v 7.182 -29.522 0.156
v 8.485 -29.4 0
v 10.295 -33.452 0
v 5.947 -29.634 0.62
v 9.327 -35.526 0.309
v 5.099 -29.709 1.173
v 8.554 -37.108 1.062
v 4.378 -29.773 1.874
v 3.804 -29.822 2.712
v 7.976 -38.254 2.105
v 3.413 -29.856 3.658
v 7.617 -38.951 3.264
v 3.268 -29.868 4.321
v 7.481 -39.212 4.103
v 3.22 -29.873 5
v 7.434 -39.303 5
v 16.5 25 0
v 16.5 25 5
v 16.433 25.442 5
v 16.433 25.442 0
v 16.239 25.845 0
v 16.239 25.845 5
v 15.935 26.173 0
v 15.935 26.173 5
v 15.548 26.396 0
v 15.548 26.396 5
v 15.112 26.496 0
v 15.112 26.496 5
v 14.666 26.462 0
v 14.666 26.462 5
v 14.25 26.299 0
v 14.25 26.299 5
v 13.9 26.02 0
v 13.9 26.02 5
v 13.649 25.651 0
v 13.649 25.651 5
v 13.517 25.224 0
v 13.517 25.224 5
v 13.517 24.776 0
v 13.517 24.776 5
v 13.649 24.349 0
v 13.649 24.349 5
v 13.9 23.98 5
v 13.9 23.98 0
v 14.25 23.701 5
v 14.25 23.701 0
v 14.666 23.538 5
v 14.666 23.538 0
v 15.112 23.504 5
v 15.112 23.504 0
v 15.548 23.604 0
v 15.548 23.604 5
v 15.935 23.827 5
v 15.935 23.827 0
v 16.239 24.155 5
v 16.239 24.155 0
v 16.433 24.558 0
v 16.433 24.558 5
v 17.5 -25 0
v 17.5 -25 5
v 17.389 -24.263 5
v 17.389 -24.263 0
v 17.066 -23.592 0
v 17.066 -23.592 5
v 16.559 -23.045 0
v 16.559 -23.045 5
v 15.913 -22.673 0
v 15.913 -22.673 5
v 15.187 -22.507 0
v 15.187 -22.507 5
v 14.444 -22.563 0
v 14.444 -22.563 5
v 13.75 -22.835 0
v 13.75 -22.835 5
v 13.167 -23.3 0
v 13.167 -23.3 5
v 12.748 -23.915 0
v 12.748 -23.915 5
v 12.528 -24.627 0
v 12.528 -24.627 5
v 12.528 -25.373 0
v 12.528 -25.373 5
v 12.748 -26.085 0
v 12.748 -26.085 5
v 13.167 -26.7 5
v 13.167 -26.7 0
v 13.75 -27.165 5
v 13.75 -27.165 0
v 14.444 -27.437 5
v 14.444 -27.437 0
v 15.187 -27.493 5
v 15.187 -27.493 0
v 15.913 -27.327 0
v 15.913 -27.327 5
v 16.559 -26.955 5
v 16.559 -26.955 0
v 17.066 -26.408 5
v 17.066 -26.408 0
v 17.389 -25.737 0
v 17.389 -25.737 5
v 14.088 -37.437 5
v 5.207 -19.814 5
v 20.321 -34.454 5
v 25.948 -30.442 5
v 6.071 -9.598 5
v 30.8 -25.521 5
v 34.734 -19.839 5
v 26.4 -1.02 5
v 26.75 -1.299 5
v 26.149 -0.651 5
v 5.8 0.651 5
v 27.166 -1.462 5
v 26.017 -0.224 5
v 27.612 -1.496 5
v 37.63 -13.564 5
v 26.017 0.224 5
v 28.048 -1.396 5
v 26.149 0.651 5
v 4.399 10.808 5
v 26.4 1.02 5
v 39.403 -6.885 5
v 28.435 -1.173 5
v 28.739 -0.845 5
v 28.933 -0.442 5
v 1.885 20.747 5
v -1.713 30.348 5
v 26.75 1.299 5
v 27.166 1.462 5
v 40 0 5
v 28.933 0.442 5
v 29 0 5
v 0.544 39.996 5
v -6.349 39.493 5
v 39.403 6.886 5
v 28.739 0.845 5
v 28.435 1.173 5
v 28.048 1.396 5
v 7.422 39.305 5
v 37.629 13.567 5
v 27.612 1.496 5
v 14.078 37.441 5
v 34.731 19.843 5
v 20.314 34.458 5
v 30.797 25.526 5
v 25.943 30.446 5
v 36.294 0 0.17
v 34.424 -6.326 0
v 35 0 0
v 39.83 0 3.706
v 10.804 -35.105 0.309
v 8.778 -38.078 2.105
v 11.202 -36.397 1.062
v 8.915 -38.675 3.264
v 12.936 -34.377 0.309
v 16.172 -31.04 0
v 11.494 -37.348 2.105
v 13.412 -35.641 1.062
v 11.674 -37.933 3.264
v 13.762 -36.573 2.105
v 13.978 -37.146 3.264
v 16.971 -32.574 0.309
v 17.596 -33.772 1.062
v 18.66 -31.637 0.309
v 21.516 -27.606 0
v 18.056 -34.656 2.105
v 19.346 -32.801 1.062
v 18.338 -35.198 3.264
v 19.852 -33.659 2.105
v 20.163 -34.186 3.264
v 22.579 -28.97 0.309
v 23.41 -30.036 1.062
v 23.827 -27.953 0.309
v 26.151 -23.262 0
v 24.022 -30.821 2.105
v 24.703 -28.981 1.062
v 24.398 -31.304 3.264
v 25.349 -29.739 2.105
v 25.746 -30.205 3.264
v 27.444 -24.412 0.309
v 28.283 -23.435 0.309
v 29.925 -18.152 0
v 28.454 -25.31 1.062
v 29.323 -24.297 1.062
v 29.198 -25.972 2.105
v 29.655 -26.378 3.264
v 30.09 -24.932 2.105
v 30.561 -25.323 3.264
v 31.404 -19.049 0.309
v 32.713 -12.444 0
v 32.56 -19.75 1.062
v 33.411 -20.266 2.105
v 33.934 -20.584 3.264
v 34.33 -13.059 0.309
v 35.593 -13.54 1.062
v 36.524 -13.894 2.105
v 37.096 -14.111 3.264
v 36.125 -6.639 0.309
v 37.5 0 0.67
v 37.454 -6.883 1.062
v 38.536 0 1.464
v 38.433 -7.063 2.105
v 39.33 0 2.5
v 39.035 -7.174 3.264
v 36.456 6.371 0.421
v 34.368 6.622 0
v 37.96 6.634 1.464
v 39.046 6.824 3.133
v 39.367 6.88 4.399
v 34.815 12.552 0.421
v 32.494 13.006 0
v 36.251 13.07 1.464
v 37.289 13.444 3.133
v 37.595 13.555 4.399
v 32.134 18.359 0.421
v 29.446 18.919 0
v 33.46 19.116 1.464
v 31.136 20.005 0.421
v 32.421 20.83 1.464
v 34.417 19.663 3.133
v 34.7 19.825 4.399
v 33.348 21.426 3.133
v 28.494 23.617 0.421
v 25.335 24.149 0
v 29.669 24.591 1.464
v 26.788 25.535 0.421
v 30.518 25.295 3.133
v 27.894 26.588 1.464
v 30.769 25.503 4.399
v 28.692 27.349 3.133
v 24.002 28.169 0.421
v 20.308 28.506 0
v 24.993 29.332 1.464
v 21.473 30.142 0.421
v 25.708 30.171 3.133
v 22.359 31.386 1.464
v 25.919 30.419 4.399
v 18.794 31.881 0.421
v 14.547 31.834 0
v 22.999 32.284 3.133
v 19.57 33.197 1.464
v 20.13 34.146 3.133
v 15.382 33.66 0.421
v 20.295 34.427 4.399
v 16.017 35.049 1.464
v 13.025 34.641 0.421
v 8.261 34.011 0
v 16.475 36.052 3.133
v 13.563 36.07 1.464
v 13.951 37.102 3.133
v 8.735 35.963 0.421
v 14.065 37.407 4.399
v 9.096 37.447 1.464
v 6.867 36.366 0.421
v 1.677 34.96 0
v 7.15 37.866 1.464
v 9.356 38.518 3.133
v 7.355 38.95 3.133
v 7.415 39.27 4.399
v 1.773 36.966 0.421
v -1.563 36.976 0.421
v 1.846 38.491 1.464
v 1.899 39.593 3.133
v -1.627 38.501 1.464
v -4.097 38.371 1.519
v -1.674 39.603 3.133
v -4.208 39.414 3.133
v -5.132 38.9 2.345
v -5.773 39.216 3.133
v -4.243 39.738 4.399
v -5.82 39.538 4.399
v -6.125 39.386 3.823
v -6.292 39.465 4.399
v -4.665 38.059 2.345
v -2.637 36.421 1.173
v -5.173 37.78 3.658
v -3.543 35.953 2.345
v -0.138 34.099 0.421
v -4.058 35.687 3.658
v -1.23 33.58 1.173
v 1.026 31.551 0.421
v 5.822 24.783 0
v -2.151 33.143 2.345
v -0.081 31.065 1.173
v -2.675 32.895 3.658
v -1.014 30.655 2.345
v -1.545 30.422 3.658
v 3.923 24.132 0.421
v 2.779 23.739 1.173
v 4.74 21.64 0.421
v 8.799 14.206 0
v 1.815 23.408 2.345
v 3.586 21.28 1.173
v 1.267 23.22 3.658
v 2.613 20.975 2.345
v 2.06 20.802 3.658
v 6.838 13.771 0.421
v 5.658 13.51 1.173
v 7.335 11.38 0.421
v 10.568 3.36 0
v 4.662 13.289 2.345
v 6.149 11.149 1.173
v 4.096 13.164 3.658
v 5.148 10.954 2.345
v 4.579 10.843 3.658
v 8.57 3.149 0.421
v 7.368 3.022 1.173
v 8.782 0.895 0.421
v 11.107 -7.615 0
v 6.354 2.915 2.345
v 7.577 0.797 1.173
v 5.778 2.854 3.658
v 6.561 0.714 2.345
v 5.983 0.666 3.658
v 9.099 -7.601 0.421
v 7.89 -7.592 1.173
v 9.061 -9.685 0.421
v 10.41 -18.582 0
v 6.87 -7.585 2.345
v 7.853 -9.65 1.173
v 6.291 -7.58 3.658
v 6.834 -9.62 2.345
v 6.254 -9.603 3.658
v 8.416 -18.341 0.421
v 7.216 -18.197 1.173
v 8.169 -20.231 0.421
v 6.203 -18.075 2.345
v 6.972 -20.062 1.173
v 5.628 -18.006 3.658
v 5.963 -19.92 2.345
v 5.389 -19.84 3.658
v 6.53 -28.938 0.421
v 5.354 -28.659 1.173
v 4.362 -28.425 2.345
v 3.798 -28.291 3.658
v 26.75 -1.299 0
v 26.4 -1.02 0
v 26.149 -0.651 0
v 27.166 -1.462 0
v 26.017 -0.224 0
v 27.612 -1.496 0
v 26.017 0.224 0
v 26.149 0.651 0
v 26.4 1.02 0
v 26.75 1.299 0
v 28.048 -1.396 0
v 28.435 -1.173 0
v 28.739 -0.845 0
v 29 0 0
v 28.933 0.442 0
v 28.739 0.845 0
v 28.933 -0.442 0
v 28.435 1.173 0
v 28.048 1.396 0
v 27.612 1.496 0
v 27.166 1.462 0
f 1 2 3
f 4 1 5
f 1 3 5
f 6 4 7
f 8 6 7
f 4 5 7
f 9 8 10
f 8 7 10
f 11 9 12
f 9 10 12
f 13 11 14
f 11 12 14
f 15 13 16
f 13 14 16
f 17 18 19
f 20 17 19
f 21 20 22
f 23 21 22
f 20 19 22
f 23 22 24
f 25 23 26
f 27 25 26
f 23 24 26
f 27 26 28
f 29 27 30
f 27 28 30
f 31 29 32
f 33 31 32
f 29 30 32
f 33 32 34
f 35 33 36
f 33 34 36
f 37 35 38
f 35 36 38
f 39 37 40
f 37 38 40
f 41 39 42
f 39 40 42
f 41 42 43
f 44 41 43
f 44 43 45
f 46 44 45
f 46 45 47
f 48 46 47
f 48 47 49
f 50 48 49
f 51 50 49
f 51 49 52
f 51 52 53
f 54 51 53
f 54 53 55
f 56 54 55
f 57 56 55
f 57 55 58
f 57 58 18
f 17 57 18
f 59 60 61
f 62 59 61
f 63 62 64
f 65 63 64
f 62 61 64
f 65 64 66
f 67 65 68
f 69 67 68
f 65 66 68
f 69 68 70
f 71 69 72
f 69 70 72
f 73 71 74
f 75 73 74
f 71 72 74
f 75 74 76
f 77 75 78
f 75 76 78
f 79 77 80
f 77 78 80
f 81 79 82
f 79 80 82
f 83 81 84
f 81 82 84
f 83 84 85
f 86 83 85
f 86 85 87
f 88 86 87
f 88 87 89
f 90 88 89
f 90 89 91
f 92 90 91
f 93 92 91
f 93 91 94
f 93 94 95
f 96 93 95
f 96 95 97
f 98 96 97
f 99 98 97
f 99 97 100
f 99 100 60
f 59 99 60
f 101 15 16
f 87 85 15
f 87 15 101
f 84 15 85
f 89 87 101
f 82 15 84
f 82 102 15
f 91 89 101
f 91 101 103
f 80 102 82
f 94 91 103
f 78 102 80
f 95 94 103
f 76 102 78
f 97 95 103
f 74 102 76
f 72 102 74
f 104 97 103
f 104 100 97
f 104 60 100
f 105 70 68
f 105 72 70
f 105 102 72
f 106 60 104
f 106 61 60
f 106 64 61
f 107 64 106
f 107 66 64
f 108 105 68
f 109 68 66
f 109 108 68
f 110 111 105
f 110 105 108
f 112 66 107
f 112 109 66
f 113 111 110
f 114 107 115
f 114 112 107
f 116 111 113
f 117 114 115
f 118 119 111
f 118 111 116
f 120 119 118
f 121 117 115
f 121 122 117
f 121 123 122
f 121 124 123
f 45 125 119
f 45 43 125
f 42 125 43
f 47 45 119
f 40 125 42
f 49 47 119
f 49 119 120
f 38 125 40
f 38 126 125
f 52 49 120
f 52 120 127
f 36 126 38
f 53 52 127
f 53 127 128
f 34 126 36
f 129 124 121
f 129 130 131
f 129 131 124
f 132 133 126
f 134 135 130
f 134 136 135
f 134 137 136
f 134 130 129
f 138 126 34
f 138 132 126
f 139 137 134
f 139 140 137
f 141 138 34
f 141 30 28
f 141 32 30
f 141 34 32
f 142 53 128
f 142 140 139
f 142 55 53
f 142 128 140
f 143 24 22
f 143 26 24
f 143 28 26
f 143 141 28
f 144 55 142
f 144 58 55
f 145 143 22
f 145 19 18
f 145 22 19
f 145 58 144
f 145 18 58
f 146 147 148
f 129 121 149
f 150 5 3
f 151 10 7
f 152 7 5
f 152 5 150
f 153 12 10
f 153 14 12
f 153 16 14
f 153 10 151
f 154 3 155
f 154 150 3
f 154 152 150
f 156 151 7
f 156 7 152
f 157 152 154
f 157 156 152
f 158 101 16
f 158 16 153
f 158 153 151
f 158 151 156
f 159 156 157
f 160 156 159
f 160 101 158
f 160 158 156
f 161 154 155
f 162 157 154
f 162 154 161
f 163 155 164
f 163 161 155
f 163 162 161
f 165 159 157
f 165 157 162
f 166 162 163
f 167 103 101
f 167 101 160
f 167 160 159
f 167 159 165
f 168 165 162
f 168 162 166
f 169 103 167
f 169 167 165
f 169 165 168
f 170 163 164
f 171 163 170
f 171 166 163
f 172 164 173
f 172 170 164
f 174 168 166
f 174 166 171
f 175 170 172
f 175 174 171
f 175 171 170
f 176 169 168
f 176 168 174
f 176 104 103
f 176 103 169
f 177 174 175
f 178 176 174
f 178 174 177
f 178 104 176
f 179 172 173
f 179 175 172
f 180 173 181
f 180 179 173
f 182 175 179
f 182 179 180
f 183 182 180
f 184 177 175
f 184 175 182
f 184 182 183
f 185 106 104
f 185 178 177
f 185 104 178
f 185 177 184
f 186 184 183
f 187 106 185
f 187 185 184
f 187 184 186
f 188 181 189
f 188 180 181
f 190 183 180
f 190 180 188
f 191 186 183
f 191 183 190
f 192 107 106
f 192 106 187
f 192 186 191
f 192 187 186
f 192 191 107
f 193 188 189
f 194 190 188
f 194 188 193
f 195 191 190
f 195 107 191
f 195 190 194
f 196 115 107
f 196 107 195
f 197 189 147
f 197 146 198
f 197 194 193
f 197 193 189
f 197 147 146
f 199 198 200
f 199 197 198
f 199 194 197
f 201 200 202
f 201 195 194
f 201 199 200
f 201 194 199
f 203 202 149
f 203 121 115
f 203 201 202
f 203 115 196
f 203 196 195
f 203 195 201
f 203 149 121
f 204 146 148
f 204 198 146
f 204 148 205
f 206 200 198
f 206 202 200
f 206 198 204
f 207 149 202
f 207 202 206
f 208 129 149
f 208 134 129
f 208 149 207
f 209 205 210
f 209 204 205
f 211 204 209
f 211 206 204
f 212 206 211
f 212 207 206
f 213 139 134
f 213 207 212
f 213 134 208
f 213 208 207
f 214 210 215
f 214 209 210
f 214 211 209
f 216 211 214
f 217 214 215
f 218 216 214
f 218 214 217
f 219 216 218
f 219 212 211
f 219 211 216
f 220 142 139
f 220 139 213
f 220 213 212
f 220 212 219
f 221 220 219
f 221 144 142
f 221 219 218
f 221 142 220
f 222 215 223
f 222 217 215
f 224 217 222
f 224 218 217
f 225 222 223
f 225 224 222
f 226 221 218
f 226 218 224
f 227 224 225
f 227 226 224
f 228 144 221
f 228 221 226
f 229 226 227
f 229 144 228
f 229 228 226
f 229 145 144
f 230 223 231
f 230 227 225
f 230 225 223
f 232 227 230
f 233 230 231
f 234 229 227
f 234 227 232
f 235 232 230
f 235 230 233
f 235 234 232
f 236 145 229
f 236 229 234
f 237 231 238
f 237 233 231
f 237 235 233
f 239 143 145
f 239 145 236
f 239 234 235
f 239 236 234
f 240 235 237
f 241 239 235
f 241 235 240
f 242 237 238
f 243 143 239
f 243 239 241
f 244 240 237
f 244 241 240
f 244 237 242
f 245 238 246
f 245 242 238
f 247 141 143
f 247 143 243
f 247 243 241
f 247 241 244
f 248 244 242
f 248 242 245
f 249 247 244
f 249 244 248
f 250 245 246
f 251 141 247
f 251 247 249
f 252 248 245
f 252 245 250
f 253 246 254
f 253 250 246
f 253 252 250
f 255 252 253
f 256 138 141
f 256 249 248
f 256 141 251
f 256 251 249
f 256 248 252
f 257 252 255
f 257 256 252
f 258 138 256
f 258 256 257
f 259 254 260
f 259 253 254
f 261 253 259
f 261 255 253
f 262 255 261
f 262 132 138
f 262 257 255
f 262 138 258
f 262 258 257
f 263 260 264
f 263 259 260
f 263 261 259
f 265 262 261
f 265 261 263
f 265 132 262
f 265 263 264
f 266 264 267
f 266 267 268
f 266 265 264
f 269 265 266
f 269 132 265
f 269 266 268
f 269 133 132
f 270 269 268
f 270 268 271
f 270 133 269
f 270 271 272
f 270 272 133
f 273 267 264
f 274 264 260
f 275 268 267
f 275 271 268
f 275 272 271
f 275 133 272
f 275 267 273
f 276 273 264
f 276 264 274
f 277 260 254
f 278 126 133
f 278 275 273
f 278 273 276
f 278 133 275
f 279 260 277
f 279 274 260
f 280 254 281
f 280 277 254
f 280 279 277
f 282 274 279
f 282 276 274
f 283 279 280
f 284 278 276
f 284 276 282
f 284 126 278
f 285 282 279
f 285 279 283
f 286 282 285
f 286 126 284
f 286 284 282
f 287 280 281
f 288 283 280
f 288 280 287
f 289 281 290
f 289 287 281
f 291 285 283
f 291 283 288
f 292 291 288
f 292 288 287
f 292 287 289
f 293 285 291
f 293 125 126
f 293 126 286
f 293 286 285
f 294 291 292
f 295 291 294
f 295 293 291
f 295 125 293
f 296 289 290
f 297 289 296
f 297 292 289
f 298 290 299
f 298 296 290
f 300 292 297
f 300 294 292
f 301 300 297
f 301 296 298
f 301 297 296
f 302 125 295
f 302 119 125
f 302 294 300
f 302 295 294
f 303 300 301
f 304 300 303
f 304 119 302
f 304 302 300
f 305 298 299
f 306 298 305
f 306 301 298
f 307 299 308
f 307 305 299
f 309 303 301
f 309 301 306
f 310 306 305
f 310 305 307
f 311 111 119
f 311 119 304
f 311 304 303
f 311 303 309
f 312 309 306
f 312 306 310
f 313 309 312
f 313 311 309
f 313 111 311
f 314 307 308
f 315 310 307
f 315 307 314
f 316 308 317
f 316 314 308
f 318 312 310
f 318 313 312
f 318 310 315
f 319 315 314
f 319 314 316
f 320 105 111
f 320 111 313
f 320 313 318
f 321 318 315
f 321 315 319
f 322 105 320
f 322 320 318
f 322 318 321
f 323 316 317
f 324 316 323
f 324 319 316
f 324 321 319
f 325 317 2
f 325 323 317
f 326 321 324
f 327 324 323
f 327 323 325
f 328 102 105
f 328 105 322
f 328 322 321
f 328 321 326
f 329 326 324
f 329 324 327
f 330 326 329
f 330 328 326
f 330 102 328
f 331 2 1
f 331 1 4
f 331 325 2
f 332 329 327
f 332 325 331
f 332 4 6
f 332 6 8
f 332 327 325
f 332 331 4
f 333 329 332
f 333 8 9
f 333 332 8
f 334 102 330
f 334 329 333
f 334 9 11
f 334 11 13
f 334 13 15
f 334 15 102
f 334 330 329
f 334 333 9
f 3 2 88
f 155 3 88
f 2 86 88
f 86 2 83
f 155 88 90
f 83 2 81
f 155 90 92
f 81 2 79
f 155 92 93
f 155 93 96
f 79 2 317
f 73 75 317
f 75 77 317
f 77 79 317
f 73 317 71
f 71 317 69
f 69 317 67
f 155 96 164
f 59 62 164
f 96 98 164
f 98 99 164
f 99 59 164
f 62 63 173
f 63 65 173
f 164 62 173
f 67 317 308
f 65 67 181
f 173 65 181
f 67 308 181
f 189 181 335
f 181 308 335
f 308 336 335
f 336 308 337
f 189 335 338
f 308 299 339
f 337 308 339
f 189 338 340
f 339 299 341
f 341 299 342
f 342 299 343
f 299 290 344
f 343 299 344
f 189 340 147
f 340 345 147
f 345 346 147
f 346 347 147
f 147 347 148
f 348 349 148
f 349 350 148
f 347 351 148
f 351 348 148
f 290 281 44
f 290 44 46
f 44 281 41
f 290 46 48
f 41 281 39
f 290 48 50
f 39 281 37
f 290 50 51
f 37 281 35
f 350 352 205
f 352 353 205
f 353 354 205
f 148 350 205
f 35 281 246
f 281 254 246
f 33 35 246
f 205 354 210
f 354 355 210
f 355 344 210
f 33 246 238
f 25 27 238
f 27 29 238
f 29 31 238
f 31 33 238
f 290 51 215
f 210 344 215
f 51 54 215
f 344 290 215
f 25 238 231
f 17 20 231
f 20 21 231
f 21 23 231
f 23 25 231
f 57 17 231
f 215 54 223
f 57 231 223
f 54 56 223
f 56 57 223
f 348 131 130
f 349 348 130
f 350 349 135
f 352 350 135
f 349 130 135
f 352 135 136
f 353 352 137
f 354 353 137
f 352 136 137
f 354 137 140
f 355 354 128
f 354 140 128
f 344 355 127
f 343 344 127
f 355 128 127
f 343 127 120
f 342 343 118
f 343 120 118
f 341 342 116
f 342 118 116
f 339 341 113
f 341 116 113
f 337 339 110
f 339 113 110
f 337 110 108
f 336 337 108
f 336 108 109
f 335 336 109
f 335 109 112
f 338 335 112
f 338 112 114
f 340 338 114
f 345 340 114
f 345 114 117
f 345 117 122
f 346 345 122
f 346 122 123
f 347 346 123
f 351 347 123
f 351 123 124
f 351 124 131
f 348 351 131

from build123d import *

# Parameters (mm, degrees)
BOSS_EXTRUDE1_DEPTH = 5
SKETCH2_R           = 2.5
SKETCH2_R_2         = 1.5
CUT_EXTRUDE1_DEPTH  = 10
FILLET2_R           = 5


# Some blends are built 0.0001 mm under size
with BuildPart() as part:
    # Sketch1 → Boss-Extrude1 (new body)
    with BuildSketch(Plane.XY):
        with BuildLine():
            ThreePointArc((0, -40), (28.284271247, -28.284271247), (40, 0))
            ThreePointArc((40, 0), (25.942500138, 30.446456059), (-6.349334329, 39.492859526))
            ThreePointArc((-6.349334329, 39.492859526), (5.815471714, 0.464499257), (0, -40))
        make_face()
    extrude(amount=BOSS_EXTRUDE1_DEPTH)

    # Sketch2 → Cut-Extrude1 (cut)
    with BuildSketch(Plane.XY.offset(5)):
        with Locations((15, -25)):
            Circle(SKETCH2_R)
        with Locations((27.5, 0)):
            Circle(SKETCH2_R_2)
        with Locations((15, 25)):
            Circle(SKETCH2_R_2)
    extrude(amount=-CUT_EXTRUDE1_DEPTH, mode=Mode.SUBTRACT)

    # Chamfer1
    # the kernel refuses this chamfer: 10, 7.744855577 mm, written as the material it takes off along each edge
    with BuildSketch(Plane(origin=(0, -40, -27.321942893), x_dir=(0.9956355834600147, 0.09332622861894702, 0), z_dir=(0, 0, 1))) as chamfer1_piece_1:
        with BuildLine():
            Line((7.46609829, 0), (4.150714585, 9.782810082))
            ThreePointArc((4.150714585, 9.782810082), (2.27411481, 4.969757663), (0, 0))
            ThreePointArc((0, 0), (3.797218814, -0.17452519), (7.46609829, 0))
        make_face()
    extrude(amount=59.643885786, mode=Mode.SUBTRACT)

    # Fillet2
    fillet2_edges = [part.edges().sort_by_distance(p)[0] for p in [
        (5.326559747, -34.587866421, 0),
        (5.24041299, 5.748958646, 0),
        (39.401767574, 6.892076033, 0),
    ]]
    fillet(fillet2_edges, radius=FILLET2_R - 0.0001)  # a hair under: the kernel refuses the full size


solid = part.part
